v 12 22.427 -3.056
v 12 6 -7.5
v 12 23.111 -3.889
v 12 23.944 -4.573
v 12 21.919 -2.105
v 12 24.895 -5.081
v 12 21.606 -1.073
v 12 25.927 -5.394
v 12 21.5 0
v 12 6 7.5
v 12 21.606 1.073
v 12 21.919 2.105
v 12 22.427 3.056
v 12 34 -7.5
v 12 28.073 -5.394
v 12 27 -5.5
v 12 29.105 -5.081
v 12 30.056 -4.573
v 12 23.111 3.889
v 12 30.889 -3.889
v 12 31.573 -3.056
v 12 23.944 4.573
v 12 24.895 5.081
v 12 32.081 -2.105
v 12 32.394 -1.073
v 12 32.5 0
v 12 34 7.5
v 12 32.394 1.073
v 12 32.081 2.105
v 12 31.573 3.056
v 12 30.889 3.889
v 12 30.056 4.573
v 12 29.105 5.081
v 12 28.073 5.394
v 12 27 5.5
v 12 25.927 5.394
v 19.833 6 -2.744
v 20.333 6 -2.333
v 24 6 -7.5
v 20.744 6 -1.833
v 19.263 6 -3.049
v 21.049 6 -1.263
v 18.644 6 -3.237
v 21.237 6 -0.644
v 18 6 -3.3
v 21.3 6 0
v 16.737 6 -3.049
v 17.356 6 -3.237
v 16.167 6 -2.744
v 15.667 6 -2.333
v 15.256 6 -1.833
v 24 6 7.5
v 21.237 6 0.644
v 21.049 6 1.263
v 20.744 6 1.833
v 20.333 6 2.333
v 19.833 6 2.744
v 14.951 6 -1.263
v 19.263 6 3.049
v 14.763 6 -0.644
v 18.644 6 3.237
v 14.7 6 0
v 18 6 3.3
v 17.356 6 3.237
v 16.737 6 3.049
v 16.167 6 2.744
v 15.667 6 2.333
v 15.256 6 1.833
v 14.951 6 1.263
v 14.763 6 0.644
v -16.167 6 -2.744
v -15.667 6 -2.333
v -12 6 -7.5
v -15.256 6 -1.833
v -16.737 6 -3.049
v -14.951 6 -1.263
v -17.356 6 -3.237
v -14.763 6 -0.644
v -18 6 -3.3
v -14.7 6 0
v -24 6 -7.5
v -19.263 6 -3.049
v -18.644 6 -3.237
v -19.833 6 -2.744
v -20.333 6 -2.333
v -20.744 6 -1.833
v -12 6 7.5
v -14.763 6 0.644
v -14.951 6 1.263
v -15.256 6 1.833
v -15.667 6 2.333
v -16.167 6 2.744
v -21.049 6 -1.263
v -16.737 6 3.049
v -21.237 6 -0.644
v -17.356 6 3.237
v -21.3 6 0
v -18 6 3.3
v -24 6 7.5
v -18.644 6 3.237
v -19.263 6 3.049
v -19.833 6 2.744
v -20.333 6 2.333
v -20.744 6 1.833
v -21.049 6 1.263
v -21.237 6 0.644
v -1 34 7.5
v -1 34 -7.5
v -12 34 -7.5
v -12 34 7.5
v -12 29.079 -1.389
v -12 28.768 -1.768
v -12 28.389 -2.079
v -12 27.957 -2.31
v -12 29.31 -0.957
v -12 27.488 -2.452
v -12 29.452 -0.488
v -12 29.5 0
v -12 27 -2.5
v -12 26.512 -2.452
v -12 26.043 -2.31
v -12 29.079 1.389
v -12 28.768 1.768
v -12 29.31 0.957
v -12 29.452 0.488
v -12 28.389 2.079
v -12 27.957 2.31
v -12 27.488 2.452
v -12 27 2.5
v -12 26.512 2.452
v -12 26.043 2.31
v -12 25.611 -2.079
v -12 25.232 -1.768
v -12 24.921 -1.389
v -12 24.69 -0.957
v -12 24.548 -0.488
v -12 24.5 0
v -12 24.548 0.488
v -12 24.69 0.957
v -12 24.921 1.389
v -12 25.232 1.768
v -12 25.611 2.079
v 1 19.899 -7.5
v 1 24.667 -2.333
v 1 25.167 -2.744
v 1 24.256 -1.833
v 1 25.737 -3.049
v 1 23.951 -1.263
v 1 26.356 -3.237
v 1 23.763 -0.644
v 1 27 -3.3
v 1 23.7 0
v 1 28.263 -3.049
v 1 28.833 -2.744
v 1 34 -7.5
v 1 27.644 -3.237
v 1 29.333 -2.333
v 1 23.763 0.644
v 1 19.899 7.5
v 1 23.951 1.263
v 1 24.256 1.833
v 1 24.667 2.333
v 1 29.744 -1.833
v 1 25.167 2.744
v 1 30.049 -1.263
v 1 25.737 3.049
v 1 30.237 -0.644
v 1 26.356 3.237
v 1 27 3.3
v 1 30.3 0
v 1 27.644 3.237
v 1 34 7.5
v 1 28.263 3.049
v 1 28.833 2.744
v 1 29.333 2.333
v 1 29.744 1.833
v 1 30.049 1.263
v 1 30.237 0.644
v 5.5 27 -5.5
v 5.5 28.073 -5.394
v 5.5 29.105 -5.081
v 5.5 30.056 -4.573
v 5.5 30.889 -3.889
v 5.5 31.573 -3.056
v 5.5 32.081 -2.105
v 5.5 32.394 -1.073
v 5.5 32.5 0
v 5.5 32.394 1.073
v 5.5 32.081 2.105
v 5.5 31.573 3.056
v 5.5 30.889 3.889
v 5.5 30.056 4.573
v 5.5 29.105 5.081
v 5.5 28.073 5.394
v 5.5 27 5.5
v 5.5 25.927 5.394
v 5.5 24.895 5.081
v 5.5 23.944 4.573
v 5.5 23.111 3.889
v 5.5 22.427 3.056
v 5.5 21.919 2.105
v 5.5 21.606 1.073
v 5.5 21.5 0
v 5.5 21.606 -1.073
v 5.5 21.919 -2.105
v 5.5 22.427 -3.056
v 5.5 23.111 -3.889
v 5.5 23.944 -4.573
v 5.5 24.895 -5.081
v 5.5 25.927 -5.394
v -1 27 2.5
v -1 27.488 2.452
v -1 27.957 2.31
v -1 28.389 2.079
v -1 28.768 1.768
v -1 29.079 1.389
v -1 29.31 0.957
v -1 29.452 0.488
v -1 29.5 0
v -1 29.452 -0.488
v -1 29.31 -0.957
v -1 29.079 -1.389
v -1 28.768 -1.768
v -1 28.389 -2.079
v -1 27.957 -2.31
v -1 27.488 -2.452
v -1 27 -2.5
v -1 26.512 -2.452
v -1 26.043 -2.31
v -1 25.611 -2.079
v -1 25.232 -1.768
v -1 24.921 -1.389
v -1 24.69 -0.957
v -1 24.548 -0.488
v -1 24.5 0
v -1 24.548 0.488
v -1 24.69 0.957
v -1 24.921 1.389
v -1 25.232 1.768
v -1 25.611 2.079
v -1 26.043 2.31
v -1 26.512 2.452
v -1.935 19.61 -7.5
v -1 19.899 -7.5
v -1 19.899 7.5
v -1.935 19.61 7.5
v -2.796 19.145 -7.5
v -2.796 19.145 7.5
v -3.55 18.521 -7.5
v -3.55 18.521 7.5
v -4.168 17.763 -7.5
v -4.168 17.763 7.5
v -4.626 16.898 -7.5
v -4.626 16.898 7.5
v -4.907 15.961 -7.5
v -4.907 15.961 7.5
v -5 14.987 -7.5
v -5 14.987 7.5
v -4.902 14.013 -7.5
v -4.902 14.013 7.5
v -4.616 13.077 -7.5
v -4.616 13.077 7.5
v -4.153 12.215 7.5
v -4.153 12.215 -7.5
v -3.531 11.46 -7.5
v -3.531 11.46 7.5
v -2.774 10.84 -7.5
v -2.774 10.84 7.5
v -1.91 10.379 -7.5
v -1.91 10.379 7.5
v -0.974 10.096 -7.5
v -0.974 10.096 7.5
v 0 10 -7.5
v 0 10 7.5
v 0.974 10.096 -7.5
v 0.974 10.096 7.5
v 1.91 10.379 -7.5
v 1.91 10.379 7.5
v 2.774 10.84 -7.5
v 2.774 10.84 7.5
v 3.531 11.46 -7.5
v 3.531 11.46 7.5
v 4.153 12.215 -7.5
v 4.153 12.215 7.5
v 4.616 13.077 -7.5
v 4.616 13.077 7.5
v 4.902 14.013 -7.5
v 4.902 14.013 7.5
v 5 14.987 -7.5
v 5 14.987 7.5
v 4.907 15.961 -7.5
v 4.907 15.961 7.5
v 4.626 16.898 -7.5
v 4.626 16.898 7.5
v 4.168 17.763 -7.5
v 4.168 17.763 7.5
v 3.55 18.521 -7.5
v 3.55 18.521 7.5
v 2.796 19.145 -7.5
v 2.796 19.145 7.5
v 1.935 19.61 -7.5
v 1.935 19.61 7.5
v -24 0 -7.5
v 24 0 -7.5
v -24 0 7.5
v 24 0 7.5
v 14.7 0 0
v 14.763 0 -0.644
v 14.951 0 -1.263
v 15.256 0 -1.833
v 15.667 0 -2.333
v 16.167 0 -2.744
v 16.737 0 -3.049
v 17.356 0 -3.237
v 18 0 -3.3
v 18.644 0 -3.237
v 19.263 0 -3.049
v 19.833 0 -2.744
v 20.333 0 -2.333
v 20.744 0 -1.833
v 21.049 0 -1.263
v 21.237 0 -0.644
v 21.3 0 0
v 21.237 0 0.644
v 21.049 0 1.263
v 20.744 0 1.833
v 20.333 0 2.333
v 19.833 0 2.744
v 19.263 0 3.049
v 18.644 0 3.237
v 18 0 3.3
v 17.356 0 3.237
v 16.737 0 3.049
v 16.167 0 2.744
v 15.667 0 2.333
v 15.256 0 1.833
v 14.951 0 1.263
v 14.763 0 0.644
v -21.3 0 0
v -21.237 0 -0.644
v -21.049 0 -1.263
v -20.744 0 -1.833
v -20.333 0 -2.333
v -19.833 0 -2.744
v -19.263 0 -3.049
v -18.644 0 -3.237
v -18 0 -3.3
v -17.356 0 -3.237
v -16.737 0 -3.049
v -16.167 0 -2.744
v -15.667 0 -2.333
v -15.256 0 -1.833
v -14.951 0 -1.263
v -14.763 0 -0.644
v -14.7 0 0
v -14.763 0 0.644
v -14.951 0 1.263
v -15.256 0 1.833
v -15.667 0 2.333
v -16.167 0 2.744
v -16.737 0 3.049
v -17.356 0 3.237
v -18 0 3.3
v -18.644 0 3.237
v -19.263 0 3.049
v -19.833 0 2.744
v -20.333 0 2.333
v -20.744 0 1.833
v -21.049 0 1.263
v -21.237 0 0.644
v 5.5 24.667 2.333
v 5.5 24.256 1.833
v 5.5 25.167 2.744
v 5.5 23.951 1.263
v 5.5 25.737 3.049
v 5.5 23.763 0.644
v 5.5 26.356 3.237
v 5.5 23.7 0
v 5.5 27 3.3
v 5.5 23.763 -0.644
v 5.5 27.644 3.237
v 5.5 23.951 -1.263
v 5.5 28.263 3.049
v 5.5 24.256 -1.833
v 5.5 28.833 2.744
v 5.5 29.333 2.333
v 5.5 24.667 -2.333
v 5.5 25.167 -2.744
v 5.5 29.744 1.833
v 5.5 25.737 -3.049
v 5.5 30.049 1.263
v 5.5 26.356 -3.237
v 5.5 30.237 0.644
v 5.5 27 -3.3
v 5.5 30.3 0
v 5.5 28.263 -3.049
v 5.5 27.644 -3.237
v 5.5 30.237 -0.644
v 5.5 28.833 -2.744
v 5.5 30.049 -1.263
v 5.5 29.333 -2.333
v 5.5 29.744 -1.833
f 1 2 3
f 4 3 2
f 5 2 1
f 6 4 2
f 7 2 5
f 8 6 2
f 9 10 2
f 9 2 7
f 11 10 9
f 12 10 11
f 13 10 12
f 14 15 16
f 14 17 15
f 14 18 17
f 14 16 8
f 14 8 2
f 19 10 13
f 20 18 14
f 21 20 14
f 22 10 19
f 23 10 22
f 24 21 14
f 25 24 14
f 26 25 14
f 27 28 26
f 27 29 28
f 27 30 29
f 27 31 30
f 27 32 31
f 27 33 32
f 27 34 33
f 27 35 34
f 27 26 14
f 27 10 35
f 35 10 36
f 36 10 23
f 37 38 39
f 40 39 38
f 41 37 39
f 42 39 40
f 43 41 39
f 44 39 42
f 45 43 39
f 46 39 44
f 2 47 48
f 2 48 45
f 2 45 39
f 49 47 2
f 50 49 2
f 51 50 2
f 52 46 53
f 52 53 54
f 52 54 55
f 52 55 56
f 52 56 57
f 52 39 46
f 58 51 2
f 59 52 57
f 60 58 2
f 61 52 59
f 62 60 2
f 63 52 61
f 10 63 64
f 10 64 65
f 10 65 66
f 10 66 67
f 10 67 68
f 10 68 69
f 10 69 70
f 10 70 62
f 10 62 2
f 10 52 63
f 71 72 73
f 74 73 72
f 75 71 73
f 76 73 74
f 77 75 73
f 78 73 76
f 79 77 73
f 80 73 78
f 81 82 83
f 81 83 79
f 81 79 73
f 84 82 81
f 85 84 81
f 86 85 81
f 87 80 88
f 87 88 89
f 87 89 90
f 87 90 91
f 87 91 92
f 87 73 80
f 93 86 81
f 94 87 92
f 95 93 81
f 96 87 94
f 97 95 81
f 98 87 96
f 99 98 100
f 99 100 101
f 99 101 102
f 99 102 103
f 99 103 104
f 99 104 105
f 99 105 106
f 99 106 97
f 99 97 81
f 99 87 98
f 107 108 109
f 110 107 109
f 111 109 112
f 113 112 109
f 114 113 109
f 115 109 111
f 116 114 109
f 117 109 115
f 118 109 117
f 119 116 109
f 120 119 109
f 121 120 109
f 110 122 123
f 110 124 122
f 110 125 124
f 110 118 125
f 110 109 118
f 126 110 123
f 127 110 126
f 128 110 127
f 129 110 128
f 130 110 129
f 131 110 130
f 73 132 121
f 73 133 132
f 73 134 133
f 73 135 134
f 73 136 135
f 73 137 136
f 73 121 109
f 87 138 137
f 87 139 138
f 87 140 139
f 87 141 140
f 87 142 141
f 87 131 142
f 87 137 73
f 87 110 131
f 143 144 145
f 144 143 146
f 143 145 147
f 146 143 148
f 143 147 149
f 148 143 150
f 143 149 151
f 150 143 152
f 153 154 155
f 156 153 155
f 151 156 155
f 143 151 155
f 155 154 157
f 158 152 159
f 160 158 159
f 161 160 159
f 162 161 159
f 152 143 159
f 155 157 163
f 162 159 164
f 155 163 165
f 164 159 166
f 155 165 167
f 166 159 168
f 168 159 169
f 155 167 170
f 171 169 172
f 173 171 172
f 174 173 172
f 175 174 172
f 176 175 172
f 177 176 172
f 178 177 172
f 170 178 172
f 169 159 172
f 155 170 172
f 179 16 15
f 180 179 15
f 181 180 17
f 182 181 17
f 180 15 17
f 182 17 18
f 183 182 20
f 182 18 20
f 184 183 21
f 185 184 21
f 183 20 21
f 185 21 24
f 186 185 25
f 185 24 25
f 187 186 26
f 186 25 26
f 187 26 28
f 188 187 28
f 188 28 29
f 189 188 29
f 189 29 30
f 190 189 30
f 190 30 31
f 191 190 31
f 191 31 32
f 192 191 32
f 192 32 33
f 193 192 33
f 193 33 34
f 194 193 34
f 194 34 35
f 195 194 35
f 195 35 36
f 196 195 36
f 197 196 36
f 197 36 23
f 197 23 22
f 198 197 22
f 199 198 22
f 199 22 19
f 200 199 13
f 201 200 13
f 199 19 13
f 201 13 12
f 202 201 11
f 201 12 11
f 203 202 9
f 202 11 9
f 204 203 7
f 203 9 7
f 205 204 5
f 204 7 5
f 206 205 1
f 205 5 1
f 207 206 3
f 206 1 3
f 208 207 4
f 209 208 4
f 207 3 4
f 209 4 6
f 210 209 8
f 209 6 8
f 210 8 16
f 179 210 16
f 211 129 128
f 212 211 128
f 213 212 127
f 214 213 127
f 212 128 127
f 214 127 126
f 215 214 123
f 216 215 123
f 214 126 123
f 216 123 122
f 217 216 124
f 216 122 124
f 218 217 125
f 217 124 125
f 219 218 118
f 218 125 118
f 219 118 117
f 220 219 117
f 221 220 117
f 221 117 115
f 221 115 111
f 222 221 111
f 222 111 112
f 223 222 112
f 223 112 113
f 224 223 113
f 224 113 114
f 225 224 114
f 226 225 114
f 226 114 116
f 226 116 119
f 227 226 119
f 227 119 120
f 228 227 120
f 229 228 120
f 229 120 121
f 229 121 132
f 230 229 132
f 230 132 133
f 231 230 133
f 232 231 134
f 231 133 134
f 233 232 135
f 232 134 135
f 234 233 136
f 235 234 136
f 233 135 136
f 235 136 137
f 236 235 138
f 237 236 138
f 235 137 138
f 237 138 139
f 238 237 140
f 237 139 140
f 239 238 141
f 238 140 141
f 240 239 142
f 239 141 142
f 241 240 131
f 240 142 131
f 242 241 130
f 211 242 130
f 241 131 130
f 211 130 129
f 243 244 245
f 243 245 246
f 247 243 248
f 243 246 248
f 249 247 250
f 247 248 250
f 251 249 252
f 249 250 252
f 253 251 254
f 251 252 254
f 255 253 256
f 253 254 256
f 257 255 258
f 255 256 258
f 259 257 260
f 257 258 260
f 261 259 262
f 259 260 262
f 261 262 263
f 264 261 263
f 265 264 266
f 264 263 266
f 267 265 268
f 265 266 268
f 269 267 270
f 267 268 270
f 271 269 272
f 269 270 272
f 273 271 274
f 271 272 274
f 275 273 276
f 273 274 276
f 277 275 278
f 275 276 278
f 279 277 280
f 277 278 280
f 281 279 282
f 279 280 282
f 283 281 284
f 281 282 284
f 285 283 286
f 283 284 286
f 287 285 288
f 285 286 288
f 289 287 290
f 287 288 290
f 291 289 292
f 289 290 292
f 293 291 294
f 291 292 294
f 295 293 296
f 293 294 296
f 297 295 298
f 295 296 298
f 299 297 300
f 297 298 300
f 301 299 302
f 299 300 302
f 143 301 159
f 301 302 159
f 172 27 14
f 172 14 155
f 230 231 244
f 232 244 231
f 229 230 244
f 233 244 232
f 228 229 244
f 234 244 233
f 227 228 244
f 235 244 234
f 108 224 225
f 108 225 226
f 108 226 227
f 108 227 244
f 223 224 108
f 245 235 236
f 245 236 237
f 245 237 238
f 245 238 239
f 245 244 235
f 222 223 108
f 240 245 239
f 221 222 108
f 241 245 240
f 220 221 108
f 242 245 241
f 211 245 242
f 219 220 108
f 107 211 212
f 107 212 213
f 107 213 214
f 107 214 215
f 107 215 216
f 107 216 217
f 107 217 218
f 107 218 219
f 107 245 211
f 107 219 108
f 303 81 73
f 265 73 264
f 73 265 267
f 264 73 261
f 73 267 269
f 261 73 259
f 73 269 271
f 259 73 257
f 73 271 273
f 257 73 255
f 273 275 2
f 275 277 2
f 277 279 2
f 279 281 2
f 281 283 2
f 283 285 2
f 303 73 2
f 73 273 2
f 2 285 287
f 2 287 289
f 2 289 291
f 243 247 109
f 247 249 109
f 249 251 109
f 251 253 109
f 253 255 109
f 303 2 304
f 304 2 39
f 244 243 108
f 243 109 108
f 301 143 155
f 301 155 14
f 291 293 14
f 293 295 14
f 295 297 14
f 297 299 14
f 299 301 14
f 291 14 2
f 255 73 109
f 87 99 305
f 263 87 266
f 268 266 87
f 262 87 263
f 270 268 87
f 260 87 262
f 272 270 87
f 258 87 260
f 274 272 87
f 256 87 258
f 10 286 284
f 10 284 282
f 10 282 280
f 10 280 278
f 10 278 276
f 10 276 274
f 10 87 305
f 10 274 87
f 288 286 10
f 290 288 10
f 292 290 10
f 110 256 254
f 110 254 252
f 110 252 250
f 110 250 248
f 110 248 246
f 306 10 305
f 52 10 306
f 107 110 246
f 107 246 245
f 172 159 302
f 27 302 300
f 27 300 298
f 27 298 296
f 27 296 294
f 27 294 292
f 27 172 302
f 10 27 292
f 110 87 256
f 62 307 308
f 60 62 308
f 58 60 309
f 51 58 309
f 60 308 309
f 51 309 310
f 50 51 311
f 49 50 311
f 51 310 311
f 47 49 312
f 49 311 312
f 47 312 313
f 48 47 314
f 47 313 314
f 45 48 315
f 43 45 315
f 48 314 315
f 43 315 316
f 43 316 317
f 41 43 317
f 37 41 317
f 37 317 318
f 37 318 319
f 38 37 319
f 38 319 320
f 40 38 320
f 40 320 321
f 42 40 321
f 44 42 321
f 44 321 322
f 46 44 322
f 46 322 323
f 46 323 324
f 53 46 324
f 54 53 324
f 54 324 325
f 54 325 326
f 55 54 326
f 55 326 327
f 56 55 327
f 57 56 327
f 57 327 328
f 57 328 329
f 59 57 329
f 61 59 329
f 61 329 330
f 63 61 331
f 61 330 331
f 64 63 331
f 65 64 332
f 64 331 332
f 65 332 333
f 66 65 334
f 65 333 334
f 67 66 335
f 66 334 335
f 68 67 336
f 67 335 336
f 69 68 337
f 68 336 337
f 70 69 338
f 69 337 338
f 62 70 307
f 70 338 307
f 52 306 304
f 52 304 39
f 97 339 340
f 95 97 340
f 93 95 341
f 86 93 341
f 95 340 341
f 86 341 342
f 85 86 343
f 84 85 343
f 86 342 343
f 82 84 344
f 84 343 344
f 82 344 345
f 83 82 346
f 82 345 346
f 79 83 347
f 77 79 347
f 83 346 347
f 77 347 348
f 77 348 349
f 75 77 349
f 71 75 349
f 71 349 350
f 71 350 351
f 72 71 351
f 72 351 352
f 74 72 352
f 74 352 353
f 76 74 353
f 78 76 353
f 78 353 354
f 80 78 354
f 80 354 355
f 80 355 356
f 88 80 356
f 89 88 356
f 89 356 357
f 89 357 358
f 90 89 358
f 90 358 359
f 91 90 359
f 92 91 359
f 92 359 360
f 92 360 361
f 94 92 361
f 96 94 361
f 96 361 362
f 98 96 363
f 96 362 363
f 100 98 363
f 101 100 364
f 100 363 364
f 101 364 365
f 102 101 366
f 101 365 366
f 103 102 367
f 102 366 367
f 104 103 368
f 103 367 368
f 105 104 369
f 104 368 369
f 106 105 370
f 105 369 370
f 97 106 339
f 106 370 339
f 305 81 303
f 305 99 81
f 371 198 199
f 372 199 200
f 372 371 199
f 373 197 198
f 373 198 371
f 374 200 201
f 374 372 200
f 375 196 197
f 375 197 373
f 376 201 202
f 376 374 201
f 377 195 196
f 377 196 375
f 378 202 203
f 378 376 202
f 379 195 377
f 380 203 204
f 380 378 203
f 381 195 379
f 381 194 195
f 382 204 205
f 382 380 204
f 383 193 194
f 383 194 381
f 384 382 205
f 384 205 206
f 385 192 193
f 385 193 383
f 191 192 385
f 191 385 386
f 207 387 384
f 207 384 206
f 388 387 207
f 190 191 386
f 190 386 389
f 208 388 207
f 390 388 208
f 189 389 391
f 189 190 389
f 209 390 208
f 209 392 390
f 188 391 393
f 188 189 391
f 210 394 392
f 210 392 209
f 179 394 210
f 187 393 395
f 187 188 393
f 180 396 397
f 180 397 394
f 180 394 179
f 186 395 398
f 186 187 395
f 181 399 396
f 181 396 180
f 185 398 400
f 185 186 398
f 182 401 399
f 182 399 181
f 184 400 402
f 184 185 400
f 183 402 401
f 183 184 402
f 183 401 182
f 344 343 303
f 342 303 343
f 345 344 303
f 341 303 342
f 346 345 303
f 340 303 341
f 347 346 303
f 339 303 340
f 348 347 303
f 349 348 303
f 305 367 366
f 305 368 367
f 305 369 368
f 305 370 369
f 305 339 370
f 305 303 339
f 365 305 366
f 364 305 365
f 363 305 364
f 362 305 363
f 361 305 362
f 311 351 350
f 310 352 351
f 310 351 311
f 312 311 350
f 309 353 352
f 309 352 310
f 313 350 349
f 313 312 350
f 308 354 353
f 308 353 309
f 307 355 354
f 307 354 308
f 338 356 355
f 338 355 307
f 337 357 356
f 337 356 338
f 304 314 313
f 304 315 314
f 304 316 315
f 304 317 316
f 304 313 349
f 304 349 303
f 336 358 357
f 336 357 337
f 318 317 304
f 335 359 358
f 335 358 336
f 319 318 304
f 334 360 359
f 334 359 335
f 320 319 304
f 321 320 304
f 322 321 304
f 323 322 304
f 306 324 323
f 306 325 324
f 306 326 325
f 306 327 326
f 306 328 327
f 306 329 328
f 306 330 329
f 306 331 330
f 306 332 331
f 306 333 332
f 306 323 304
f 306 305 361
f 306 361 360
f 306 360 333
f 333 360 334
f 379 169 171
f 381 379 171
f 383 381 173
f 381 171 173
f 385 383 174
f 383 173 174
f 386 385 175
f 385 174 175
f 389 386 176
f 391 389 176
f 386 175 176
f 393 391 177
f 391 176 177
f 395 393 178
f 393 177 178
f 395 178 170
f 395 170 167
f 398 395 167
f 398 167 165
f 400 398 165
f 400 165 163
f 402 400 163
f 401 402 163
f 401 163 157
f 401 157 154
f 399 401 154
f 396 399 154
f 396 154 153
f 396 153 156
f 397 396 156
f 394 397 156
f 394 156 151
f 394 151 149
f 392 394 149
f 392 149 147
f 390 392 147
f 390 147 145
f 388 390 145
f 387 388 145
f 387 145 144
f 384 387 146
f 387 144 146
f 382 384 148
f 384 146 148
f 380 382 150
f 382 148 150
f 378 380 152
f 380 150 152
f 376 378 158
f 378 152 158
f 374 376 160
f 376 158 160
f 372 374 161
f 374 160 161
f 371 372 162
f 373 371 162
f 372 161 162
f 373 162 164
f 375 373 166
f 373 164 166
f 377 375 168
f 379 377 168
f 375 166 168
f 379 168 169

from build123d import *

# Parameters (mm, degrees)
BOSS_EXTRUDE1_DEPTH                          = 7.5
SKETCH2_R                                    = 5
CUT_EXTRUDE1_DEPTH                           = 45.237992721
SKETCH3_W                                    = 2
SKETCH3_H                                    = 19
CUT_EXTRUDE2_DEPTH                           = 45.237992721
CBORE_FOR_SOCKET_HEAD_CAP_SCREW1_D           = 6.6
CBORE_FOR_SOCKET_HEAD_CAP_SCREW1_DEPTH       = 11
CBORE_FOR_SOCKET_HEAD_CAP_SCREW1_CBORE_D     = 11
CBORE_FOR_SOCKET_HEAD_CAP_SCREW1_CBORE_DEPTH = 6.5
TAPPED_HOLE1_D                               = 5
DIAMETER_HOLE1_D                             = 6.6


with BuildPart() as part:
    # Sketch1 → Boss-Extrude1 (new, symmetric)
    with BuildSketch(Plane.XY):
        Polygon((-24, 0), (24, 0), (24, 6), (12, 6), (12, 34), (-12, 34), (-12, 6), (-24, 6), align=None)
    extrude(amount=BOSS_EXTRUDE1_DEPTH, both=True)

    # Sketch2 → Cut-Extrude1 (cut, through all)
    with BuildSketch(Plane.XY.offset(7.5)):
        with Locations((0, 15)):
            Circle(SKETCH2_R)
    extrude(amount=-CUT_EXTRUDE1_DEPTH, mode=Mode.SUBTRACT)

    # Sketch3 → Cut-Extrude2 (cut, through all)
    with BuildSketch(Plane.XY.offset(7.5)):
        with Locations((0, 24.5)):
            Rectangle(SKETCH3_W, SKETCH3_H)
    extrude(amount=-CUT_EXTRUDE2_DEPTH, mode=Mode.SUBTRACT)

    # CBORE for Socket Head Cap Screw1
    with Locations(Plane(origin=(12, 0, 0), x_dir=(0, 0, -1), z_dir=(1, 0, 0))):
        with Locations((0, 27)):
            CounterBoreHole(CBORE_FOR_SOCKET_HEAD_CAP_SCREW1_D / 2, CBORE_FOR_SOCKET_HEAD_CAP_SCREW1_CBORE_D / 2, CBORE_FOR_SOCKET_HEAD_CAP_SCREW1_CBORE_DEPTH, depth=CBORE_FOR_SOCKET_HEAD_CAP_SCREW1_DEPTH)

    # Tapped Hole1 (through all)
    with Locations(Plane(origin=(-1, 0, 0), x_dir=(0, 0, -1), z_dir=(1, 0, 0))):
        with Locations((0, 27)):
            Hole(TAPPED_HOLE1_D / 2)

    # Diameter Hole1 (through all)
    with Locations(Plane(origin=(0, 6, 0), x_dir=(1, 0, 0), z_dir=(0, 1, 0))):
        with Locations((18, 0), (-18, 0)):
            Hole(DIAMETER_HOLE1_D / 2)


solid = part.part
